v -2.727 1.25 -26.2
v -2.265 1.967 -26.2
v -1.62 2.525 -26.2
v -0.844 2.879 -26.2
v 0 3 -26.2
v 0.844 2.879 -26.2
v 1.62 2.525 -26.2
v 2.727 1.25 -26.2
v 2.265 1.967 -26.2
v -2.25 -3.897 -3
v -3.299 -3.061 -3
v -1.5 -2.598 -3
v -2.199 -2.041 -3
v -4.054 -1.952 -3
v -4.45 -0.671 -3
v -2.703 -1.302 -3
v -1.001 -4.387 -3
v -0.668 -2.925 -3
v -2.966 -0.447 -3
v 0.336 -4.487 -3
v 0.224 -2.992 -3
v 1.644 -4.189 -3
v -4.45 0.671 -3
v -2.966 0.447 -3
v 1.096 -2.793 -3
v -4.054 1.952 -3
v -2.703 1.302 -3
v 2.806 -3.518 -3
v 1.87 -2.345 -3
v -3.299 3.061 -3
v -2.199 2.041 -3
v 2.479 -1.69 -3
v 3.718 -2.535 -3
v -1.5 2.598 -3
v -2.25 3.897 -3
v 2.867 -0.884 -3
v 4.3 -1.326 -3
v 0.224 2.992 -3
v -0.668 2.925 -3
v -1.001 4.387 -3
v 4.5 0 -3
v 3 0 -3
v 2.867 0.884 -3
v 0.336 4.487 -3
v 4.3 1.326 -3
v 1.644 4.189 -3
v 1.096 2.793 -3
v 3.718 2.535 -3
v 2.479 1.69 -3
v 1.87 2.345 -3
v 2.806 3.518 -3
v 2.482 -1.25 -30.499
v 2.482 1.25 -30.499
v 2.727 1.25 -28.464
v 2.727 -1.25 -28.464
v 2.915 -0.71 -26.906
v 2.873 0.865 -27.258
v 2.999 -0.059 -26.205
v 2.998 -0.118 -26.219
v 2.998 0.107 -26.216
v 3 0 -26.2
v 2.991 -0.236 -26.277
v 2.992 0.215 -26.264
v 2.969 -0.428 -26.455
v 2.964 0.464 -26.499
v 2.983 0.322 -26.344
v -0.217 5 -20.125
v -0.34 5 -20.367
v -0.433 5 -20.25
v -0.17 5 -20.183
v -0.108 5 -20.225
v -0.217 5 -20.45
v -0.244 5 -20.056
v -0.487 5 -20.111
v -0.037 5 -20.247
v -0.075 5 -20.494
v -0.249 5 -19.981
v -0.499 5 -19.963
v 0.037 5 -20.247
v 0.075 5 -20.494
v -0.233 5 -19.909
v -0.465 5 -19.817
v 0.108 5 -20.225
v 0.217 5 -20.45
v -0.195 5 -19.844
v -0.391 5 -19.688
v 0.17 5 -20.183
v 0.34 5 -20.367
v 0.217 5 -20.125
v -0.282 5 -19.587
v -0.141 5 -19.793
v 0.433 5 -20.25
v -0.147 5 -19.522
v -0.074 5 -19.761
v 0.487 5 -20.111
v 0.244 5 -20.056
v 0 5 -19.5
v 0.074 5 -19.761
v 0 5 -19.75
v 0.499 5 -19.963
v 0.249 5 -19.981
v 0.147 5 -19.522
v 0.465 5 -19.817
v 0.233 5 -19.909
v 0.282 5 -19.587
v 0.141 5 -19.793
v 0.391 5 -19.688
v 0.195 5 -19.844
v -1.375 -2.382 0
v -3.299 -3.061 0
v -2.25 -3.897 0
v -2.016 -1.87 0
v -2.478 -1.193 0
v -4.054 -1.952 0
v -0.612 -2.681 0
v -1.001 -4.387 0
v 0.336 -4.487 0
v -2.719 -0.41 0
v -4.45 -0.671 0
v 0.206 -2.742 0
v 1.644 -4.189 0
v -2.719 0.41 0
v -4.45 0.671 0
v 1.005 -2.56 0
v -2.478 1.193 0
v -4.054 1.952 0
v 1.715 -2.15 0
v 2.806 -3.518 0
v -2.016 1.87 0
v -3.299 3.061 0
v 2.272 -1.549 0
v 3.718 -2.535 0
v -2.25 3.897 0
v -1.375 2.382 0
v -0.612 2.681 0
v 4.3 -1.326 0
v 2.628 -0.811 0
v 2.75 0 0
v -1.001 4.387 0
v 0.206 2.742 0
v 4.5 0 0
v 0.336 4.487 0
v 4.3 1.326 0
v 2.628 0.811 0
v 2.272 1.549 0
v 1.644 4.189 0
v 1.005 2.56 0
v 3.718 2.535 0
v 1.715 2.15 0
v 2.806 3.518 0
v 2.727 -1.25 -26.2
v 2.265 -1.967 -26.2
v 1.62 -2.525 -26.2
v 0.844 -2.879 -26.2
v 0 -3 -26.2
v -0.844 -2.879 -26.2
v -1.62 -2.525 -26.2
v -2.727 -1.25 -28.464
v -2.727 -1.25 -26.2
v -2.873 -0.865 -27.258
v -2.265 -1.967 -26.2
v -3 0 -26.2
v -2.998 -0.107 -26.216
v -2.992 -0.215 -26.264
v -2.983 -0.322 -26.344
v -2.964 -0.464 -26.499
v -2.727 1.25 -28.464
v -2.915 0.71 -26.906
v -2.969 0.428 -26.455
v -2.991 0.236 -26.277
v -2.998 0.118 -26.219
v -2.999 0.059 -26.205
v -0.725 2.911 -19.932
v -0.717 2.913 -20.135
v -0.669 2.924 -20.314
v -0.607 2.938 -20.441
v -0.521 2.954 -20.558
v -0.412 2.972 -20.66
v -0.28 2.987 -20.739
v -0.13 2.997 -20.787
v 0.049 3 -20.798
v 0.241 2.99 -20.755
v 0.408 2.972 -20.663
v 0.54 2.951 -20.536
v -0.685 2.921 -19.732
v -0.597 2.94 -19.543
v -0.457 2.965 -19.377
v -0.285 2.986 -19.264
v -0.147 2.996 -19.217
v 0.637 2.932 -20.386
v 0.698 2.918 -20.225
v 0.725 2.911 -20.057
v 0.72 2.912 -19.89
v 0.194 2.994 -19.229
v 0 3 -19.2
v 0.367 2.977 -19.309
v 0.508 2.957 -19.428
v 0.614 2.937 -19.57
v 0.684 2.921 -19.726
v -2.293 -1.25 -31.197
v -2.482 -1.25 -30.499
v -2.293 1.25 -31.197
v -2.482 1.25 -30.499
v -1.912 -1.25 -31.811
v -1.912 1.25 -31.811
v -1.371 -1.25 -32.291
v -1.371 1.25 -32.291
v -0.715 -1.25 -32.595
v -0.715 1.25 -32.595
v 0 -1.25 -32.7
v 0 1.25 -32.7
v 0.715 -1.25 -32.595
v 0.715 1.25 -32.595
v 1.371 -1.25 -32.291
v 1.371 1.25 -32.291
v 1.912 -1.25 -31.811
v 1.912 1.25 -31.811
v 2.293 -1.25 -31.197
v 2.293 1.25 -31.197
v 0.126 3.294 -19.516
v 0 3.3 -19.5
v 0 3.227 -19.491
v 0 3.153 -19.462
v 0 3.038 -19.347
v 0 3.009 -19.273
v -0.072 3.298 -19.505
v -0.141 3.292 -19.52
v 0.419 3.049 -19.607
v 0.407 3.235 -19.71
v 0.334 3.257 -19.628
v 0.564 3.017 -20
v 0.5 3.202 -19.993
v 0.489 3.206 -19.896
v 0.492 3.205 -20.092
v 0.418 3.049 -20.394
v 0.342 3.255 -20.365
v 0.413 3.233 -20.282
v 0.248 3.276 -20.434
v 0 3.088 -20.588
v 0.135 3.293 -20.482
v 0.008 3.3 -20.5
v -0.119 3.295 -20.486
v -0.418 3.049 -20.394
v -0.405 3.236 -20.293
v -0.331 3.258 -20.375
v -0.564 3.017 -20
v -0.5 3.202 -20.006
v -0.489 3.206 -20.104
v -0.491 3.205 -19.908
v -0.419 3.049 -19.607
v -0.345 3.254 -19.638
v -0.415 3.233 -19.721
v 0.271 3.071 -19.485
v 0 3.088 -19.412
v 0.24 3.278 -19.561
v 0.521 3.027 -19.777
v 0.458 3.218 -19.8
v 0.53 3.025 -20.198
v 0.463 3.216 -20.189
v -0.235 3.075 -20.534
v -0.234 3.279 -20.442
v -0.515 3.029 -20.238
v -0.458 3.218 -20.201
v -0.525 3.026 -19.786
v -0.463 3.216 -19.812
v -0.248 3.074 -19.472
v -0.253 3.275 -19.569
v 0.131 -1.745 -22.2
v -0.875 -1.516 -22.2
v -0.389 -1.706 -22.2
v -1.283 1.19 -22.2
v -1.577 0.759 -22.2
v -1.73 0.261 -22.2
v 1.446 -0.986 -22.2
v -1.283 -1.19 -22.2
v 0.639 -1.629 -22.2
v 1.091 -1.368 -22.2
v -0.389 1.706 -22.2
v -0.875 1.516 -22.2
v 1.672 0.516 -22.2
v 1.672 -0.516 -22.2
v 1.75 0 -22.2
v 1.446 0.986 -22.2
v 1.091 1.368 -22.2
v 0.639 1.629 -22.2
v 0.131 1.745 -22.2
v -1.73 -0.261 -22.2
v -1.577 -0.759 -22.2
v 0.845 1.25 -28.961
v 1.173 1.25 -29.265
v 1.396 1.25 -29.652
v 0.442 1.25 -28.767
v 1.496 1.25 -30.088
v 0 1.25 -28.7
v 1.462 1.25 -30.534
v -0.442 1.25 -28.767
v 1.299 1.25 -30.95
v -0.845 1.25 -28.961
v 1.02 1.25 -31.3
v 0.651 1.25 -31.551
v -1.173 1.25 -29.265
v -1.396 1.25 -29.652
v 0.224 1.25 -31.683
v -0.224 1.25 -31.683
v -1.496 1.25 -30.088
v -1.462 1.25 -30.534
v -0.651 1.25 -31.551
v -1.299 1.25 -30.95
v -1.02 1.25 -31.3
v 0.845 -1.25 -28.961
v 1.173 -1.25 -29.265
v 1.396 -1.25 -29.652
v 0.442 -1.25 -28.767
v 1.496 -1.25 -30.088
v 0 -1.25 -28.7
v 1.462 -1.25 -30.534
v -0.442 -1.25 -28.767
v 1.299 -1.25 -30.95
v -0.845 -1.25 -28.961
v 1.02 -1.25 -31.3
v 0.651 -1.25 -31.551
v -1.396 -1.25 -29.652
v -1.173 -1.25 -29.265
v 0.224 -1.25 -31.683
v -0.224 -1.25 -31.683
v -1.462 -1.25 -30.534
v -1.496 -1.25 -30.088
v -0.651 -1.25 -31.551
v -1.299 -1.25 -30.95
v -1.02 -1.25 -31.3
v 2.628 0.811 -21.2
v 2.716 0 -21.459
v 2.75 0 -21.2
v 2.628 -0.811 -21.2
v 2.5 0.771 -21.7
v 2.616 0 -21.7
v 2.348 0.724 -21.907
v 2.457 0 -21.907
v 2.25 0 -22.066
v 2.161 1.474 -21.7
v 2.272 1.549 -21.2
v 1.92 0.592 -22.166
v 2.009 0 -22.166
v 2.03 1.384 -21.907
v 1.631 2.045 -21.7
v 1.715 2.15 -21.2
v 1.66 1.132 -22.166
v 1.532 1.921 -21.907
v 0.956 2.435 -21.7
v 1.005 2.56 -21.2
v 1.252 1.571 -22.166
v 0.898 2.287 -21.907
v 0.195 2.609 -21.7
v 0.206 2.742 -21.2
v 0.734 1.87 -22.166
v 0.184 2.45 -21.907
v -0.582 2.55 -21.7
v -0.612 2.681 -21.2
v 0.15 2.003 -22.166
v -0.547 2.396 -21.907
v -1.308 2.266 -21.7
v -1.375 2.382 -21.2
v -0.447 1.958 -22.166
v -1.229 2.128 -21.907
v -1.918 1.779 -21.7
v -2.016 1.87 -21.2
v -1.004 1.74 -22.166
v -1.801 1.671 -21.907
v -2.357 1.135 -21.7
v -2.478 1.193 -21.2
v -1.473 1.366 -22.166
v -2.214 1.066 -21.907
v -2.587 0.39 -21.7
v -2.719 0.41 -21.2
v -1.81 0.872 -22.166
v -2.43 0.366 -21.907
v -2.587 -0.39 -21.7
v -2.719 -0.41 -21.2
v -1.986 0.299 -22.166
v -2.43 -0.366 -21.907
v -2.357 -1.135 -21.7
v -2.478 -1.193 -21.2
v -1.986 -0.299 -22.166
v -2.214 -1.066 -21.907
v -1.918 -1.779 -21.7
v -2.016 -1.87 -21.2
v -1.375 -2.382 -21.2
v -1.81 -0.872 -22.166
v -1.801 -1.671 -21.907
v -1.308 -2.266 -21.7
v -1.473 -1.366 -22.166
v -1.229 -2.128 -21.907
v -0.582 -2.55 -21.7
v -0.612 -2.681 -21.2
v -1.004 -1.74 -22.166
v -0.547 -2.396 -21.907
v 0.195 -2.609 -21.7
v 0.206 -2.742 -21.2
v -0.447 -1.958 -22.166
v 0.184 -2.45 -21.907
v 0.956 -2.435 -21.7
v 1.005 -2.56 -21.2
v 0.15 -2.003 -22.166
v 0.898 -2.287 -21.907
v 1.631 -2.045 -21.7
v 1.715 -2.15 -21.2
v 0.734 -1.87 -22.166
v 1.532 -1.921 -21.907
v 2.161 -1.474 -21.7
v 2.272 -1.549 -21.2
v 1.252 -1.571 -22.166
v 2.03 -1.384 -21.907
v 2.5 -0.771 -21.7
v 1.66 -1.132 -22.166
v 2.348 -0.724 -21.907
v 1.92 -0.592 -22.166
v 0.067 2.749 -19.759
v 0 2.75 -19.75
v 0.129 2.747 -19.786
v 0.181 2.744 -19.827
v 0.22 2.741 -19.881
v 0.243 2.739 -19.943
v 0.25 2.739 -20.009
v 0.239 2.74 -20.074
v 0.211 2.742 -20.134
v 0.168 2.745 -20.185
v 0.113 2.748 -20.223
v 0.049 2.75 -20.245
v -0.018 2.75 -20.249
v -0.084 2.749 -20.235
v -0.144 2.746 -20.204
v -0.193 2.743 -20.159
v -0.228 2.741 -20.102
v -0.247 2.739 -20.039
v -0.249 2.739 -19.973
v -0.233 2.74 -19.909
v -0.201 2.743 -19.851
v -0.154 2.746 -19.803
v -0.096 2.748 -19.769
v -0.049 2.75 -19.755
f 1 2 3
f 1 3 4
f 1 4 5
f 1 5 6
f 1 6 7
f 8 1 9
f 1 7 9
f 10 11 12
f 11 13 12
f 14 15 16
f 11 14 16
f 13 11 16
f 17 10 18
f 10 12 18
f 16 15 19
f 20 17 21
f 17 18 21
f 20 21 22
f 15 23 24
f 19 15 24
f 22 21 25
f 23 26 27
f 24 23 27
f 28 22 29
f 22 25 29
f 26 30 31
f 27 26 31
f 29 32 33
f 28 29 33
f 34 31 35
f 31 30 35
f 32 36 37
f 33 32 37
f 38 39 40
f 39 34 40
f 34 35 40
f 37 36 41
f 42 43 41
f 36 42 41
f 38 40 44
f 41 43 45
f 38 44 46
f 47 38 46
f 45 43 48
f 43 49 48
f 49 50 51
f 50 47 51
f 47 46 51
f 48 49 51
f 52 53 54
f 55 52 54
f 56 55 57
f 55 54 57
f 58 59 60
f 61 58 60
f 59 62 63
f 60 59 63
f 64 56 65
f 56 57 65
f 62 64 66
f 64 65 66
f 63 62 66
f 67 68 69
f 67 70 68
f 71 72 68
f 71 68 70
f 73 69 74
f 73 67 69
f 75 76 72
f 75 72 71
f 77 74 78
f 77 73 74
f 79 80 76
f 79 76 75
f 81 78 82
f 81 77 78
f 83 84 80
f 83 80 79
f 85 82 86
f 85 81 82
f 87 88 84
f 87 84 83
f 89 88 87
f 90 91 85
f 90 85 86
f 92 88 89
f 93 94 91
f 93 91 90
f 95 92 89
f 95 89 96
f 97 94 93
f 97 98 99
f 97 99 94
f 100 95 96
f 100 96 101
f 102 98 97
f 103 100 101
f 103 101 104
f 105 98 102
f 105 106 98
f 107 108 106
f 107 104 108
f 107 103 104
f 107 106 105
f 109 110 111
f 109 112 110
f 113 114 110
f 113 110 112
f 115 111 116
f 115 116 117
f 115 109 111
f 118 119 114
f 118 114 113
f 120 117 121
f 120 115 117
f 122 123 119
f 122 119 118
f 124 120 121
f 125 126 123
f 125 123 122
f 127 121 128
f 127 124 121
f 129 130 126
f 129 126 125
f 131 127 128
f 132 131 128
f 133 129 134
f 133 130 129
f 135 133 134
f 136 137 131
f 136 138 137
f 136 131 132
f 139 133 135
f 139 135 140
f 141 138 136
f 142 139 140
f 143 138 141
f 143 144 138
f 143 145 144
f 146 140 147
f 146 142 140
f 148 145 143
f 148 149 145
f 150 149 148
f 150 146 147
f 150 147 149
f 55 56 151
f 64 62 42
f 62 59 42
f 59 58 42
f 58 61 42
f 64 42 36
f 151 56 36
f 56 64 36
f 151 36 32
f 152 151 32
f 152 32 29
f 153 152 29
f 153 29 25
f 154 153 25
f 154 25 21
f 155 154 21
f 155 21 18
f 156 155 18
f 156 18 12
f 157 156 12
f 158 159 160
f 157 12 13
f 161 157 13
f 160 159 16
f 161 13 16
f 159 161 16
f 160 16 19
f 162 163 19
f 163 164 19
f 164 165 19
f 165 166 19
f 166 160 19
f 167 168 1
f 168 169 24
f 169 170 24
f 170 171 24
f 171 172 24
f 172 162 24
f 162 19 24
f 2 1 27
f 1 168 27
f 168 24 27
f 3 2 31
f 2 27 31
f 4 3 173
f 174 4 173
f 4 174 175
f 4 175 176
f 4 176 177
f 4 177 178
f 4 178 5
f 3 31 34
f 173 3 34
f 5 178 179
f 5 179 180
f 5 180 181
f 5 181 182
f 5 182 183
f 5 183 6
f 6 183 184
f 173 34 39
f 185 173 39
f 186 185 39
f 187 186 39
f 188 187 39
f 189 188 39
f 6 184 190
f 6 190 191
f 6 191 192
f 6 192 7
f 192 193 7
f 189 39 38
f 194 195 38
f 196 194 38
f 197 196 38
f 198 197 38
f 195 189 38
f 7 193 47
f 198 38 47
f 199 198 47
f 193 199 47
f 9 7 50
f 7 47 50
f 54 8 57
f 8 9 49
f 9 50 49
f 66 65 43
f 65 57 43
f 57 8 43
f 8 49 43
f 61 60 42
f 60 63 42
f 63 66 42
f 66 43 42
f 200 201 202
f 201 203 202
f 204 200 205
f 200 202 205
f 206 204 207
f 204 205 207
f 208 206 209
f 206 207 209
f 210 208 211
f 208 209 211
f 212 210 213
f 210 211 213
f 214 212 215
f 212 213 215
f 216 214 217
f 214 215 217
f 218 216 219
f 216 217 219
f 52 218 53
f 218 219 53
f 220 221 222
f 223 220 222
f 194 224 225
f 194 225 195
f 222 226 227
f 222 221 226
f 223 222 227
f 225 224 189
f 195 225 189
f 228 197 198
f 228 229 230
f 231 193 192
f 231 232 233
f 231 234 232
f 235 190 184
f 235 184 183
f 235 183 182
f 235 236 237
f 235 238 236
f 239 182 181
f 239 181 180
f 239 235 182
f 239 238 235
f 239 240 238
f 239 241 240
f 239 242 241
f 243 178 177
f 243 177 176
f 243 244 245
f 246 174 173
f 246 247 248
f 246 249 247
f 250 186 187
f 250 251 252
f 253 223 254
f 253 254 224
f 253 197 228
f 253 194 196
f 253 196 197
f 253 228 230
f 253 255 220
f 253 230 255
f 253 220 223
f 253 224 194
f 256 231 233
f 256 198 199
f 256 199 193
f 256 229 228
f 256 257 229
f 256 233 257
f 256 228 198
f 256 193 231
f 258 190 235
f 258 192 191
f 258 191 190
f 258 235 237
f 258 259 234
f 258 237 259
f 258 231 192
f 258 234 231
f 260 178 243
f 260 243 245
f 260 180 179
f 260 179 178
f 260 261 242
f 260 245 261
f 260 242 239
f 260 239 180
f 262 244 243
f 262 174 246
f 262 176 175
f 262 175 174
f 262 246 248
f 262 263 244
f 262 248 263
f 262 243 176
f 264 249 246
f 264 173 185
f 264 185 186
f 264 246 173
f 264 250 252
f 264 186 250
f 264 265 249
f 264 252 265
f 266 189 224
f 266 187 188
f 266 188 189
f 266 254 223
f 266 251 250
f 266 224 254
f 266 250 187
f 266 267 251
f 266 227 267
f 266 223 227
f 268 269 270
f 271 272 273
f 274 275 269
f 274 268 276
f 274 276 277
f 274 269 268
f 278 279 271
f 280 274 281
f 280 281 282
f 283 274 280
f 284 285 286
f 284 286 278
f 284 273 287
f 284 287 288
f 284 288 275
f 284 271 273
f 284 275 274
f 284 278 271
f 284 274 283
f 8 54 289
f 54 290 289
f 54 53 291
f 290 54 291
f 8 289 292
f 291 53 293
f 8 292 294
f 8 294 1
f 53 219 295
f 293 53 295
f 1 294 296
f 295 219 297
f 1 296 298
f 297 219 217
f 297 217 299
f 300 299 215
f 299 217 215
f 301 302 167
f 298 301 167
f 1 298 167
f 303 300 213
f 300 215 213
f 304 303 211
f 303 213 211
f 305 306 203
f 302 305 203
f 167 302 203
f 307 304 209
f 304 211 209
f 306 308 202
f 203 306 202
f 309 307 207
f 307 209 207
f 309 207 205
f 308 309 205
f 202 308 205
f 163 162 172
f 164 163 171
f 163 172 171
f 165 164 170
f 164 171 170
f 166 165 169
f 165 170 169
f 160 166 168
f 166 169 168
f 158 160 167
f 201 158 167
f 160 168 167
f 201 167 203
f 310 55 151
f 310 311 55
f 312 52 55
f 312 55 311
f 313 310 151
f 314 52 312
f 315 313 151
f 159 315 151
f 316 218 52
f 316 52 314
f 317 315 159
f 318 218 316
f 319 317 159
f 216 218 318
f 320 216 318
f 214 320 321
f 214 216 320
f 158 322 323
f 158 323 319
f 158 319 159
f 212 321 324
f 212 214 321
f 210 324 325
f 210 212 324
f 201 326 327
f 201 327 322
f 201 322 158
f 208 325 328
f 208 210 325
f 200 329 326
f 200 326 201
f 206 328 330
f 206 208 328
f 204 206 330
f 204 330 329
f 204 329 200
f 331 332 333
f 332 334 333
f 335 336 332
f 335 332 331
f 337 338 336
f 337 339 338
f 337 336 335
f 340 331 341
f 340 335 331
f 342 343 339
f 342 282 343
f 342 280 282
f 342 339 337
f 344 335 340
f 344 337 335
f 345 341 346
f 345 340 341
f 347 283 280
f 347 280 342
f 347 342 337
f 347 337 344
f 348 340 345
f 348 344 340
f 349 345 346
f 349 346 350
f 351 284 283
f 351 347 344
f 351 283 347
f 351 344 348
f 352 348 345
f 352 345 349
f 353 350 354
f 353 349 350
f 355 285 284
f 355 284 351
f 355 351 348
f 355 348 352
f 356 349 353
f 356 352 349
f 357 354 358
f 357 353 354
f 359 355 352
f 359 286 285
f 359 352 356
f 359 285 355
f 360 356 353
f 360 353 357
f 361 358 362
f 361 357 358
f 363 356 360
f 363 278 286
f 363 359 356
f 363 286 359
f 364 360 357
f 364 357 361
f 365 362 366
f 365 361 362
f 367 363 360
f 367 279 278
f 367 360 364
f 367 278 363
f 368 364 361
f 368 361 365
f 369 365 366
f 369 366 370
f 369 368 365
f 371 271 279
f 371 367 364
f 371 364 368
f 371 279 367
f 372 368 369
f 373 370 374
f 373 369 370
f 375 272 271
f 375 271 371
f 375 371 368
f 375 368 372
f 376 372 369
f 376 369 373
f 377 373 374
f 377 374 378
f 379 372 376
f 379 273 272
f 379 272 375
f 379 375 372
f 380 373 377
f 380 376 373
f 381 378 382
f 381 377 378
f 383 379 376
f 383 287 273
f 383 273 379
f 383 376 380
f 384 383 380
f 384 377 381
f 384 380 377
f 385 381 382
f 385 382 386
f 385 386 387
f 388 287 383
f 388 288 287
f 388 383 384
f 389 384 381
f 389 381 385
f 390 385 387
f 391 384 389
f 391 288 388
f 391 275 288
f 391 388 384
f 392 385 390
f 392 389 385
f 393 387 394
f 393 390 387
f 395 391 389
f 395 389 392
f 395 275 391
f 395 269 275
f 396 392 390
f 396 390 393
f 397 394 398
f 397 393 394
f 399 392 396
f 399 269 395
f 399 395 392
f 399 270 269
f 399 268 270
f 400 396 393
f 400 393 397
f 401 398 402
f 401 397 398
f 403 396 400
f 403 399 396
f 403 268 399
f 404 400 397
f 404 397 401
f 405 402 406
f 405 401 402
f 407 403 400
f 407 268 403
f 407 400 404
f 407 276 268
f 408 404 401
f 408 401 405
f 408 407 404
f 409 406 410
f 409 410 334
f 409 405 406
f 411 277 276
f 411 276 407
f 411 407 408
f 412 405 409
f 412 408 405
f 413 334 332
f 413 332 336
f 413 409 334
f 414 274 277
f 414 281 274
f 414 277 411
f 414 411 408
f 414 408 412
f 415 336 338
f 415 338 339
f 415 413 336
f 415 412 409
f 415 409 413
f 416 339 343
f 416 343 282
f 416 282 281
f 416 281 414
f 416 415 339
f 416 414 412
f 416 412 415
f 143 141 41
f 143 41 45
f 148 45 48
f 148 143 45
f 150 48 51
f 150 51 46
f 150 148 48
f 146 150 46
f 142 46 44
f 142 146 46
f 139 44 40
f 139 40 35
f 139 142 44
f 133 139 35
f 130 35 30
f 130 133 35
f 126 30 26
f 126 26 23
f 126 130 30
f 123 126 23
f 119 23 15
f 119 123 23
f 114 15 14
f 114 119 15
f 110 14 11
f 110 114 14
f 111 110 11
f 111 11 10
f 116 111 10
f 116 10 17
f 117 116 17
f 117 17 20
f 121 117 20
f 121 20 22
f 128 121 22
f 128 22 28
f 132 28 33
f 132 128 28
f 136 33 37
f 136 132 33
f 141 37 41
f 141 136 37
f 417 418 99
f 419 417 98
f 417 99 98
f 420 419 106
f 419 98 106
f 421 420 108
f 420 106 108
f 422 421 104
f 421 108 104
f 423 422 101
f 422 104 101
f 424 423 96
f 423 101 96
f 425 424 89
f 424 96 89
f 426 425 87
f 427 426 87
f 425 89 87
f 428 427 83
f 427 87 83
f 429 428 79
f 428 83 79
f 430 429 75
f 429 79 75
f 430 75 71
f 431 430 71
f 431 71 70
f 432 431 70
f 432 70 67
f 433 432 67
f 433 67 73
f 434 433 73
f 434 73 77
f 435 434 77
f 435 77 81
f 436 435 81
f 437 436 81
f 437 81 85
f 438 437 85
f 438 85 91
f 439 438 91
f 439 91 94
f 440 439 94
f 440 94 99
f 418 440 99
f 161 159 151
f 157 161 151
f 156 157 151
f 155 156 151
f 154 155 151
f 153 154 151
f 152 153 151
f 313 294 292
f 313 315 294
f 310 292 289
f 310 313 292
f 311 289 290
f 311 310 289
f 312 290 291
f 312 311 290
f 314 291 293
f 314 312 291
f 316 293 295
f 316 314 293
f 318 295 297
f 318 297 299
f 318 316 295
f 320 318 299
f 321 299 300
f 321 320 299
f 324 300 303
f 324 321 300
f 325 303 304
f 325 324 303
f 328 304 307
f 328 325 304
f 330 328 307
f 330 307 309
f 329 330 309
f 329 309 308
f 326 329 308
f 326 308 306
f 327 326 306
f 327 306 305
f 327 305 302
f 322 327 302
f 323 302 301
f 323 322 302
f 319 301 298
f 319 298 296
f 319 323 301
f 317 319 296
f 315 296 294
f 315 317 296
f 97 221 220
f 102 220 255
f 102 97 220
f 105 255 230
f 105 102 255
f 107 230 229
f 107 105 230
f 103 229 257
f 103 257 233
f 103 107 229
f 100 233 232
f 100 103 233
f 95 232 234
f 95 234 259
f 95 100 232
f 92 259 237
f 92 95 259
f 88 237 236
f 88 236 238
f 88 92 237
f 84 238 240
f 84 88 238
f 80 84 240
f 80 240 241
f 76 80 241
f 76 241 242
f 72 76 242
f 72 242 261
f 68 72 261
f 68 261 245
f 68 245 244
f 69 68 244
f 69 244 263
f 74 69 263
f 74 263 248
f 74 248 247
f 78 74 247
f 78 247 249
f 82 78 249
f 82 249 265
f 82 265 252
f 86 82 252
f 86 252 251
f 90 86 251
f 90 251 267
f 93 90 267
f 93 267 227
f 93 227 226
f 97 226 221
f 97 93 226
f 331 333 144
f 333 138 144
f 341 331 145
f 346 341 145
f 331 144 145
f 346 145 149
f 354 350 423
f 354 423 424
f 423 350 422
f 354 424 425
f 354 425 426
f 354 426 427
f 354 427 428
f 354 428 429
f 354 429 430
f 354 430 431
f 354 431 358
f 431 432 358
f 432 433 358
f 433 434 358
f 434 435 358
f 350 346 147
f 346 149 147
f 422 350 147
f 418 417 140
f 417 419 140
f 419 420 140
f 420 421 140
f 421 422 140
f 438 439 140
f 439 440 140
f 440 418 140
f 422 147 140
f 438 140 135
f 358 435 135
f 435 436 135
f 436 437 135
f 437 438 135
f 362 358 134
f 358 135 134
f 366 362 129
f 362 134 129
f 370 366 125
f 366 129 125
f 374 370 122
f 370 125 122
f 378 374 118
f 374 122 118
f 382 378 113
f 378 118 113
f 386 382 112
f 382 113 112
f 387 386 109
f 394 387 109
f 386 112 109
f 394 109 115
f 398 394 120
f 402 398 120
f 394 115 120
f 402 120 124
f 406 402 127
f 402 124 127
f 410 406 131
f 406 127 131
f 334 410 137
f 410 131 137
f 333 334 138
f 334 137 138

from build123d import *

# Parameters (mm, degrees)
SKETCH_1_R               = 4.5
EXTRUDE_1_DEPTH          = 3
SKETCH_2_R               = 3
EXTRUDE_2_DEPTH          = 26.2
SKETCH_6_R               = 1.5
EXTRUDE_3_DEPTH          = 1.25
SKETCH_8_OUTSIDE_W       = 18.018
SKETCH_8_OUTSIDE_H       = 18.018
SKETCH_8_OUTSIDE_R       = 3
CUT_EXTRUDE_3_DEPTH      = 31.374166655
SKETCH_4_R               = 2.75
CUT_EXTRUDE_1_DEPTH      = 22.2
FILLET_2_R               = 1
EXTRUDE_4_REACH          = 40.314
EXTRUDE_4_END_RADIUS     = 3
EXTRUDE_START            = 5
SKETCH_9_R               = 0.5
CUT_EXTRUDE_4_REACH      = 36.348
CUT_EXTRUDE_4_END_RADIUS = 2.75
SKETCH_10_R              = 0.25
FILLET_3_R               = 0.3


with BuildPart() as part:
    # 草圖1 → 填料-伸長1 (new body)
    with BuildSketch(Plane.XY):
        Circle(SKETCH_1_R)
    extrude(amount=-EXTRUDE_1_DEPTH)

    # 草圖2 → 填料-伸長2 (add)
    with BuildSketch(Plane.XY):
        Circle(SKETCH_2_R)
    extrude(amount=-EXTRUDE_2_DEPTH)

    # 草圖6 → 填料-伸長3 (add, symmetric)
    with BuildSketch(Plane(origin=(0, 0, 0), x_dir=(1, 0, 0), z_dir=(0, 1, 0))):
        with BuildLine():
            Line((-3, 26.2), (-2.482050808, 30.499038106))
            ThreePointArc((-2.482050808, 30.499038106), (0, 32.7), (2.482050808, 30.499038106))
            Line((2.482050808, 30.499038106), (3, 26.2))
            Line((3, 26.2), (-3, 26.2))
        make_face()
        with Locations(Location((0, 30.2, 0), (0, 0, 270))):
            Circle(SKETCH_6_R, mode=Mode.SUBTRACT)
    extrude(amount=EXTRUDE_3_DEPTH, both=True)

    # 草圖8 outside → 除料-伸長3 (cut, through all)
    with BuildSketch(Plane(origin=(0, 0, -3), x_dir=(-1, 0, 0), z_dir=(0, 0, -1))):
        Rectangle(SKETCH_8_OUTSIDE_W, SKETCH_8_OUTSIDE_H)
        with Locations(Location((0, 0, 0), (0, 0, 180))):
            Circle(SKETCH_8_OUTSIDE_R, mode=Mode.SUBTRACT)
    extrude(amount=CUT_EXTRUDE_3_DEPTH, mode=Mode.SUBTRACT)

    # 草圖4 → 除料-伸長1 (cut)
    with BuildSketch(Plane.XY):
        Circle(SKETCH_4_R)
    extrude(amount=-CUT_EXTRUDE_1_DEPTH, mode=Mode.SUBTRACT)

    # 圓角2
    fillet_2_edges = [part.edges().sort_by_distance(p)[0] for p in [
        (-2.75, 0, -22.2),
    ]]
    fillet(fillet_2_edges, radius=FILLET_2_R)

    # 填料-伸長4: up to this cylinder (the profile starts outside it)
    extrude_4_end = Plane(origin=(0, 0, -20), z_dir=(0, 0, 1)) * Cylinder(EXTRUDE_4_END_RADIUS, 87.628, mode=Mode.PRIVATE)
    # 草圖9 → 填料-伸長4 (add, up to the surface)
    with BuildSketch(Plane(origin=(0, 0, 0), x_dir=(1, 0, 0), z_dir=(0, 1, 0)).offset(EXTRUDE_START), mode=Mode.PRIVATE) as extrude_4_sk1:
        with Locations(Location((0, 20, 0), (0, 0, 270))):
            Circle(SKETCH_9_R)
    extrude_4_tool1 = extrude(extrude_4_sk1.sketch, amount=-EXTRUDE_4_REACH, mode=Mode.PRIVATE) - extrude_4_end
    add(extrude_4_tool1.solids().sort_by_distance((0, 5, -20))[0])

    # 除料-伸長4: up to this cylinder (the profile starts outside it)
    cut_extrude_4_end = Plane(origin=(0, 0, -20), z_dir=(0, 0, 1)) * Cylinder(CUT_EXTRUDE_4_END_RADIUS, 79.196, mode=Mode.PRIVATE)
    # 草圖10 → 除料-伸長4 (cut, up to the surface)
    with BuildSketch(Plane(origin=(0, 5, 0), x_dir=(1, 0, 0), z_dir=(0, 1, 0)), mode=Mode.PRIVATE) as cut_extrude_4_sk1:
        with Locations(Location((0, 20, 0), (0, 0, 270))):
            Circle(SKETCH_10_R)
    cut_extrude_4_tool1 = extrude(cut_extrude_4_sk1.sketch, amount=-CUT_EXTRUDE_4_REACH, mode=Mode.PRIVATE) - cut_extrude_4_end
    add(cut_extrude_4_tool1.solids().sort_by_distance((0, 5, -20))[0], mode=Mode.SUBTRACT)

    # 圓角3
    fillet_3_edges = [part.edges().sort_by_distance(p)[0] for p in [
        (0, 3, -20.5),
    ]]
    fillet(fillet_3_edges, radius=FILLET_3_R)


solid = part.part
